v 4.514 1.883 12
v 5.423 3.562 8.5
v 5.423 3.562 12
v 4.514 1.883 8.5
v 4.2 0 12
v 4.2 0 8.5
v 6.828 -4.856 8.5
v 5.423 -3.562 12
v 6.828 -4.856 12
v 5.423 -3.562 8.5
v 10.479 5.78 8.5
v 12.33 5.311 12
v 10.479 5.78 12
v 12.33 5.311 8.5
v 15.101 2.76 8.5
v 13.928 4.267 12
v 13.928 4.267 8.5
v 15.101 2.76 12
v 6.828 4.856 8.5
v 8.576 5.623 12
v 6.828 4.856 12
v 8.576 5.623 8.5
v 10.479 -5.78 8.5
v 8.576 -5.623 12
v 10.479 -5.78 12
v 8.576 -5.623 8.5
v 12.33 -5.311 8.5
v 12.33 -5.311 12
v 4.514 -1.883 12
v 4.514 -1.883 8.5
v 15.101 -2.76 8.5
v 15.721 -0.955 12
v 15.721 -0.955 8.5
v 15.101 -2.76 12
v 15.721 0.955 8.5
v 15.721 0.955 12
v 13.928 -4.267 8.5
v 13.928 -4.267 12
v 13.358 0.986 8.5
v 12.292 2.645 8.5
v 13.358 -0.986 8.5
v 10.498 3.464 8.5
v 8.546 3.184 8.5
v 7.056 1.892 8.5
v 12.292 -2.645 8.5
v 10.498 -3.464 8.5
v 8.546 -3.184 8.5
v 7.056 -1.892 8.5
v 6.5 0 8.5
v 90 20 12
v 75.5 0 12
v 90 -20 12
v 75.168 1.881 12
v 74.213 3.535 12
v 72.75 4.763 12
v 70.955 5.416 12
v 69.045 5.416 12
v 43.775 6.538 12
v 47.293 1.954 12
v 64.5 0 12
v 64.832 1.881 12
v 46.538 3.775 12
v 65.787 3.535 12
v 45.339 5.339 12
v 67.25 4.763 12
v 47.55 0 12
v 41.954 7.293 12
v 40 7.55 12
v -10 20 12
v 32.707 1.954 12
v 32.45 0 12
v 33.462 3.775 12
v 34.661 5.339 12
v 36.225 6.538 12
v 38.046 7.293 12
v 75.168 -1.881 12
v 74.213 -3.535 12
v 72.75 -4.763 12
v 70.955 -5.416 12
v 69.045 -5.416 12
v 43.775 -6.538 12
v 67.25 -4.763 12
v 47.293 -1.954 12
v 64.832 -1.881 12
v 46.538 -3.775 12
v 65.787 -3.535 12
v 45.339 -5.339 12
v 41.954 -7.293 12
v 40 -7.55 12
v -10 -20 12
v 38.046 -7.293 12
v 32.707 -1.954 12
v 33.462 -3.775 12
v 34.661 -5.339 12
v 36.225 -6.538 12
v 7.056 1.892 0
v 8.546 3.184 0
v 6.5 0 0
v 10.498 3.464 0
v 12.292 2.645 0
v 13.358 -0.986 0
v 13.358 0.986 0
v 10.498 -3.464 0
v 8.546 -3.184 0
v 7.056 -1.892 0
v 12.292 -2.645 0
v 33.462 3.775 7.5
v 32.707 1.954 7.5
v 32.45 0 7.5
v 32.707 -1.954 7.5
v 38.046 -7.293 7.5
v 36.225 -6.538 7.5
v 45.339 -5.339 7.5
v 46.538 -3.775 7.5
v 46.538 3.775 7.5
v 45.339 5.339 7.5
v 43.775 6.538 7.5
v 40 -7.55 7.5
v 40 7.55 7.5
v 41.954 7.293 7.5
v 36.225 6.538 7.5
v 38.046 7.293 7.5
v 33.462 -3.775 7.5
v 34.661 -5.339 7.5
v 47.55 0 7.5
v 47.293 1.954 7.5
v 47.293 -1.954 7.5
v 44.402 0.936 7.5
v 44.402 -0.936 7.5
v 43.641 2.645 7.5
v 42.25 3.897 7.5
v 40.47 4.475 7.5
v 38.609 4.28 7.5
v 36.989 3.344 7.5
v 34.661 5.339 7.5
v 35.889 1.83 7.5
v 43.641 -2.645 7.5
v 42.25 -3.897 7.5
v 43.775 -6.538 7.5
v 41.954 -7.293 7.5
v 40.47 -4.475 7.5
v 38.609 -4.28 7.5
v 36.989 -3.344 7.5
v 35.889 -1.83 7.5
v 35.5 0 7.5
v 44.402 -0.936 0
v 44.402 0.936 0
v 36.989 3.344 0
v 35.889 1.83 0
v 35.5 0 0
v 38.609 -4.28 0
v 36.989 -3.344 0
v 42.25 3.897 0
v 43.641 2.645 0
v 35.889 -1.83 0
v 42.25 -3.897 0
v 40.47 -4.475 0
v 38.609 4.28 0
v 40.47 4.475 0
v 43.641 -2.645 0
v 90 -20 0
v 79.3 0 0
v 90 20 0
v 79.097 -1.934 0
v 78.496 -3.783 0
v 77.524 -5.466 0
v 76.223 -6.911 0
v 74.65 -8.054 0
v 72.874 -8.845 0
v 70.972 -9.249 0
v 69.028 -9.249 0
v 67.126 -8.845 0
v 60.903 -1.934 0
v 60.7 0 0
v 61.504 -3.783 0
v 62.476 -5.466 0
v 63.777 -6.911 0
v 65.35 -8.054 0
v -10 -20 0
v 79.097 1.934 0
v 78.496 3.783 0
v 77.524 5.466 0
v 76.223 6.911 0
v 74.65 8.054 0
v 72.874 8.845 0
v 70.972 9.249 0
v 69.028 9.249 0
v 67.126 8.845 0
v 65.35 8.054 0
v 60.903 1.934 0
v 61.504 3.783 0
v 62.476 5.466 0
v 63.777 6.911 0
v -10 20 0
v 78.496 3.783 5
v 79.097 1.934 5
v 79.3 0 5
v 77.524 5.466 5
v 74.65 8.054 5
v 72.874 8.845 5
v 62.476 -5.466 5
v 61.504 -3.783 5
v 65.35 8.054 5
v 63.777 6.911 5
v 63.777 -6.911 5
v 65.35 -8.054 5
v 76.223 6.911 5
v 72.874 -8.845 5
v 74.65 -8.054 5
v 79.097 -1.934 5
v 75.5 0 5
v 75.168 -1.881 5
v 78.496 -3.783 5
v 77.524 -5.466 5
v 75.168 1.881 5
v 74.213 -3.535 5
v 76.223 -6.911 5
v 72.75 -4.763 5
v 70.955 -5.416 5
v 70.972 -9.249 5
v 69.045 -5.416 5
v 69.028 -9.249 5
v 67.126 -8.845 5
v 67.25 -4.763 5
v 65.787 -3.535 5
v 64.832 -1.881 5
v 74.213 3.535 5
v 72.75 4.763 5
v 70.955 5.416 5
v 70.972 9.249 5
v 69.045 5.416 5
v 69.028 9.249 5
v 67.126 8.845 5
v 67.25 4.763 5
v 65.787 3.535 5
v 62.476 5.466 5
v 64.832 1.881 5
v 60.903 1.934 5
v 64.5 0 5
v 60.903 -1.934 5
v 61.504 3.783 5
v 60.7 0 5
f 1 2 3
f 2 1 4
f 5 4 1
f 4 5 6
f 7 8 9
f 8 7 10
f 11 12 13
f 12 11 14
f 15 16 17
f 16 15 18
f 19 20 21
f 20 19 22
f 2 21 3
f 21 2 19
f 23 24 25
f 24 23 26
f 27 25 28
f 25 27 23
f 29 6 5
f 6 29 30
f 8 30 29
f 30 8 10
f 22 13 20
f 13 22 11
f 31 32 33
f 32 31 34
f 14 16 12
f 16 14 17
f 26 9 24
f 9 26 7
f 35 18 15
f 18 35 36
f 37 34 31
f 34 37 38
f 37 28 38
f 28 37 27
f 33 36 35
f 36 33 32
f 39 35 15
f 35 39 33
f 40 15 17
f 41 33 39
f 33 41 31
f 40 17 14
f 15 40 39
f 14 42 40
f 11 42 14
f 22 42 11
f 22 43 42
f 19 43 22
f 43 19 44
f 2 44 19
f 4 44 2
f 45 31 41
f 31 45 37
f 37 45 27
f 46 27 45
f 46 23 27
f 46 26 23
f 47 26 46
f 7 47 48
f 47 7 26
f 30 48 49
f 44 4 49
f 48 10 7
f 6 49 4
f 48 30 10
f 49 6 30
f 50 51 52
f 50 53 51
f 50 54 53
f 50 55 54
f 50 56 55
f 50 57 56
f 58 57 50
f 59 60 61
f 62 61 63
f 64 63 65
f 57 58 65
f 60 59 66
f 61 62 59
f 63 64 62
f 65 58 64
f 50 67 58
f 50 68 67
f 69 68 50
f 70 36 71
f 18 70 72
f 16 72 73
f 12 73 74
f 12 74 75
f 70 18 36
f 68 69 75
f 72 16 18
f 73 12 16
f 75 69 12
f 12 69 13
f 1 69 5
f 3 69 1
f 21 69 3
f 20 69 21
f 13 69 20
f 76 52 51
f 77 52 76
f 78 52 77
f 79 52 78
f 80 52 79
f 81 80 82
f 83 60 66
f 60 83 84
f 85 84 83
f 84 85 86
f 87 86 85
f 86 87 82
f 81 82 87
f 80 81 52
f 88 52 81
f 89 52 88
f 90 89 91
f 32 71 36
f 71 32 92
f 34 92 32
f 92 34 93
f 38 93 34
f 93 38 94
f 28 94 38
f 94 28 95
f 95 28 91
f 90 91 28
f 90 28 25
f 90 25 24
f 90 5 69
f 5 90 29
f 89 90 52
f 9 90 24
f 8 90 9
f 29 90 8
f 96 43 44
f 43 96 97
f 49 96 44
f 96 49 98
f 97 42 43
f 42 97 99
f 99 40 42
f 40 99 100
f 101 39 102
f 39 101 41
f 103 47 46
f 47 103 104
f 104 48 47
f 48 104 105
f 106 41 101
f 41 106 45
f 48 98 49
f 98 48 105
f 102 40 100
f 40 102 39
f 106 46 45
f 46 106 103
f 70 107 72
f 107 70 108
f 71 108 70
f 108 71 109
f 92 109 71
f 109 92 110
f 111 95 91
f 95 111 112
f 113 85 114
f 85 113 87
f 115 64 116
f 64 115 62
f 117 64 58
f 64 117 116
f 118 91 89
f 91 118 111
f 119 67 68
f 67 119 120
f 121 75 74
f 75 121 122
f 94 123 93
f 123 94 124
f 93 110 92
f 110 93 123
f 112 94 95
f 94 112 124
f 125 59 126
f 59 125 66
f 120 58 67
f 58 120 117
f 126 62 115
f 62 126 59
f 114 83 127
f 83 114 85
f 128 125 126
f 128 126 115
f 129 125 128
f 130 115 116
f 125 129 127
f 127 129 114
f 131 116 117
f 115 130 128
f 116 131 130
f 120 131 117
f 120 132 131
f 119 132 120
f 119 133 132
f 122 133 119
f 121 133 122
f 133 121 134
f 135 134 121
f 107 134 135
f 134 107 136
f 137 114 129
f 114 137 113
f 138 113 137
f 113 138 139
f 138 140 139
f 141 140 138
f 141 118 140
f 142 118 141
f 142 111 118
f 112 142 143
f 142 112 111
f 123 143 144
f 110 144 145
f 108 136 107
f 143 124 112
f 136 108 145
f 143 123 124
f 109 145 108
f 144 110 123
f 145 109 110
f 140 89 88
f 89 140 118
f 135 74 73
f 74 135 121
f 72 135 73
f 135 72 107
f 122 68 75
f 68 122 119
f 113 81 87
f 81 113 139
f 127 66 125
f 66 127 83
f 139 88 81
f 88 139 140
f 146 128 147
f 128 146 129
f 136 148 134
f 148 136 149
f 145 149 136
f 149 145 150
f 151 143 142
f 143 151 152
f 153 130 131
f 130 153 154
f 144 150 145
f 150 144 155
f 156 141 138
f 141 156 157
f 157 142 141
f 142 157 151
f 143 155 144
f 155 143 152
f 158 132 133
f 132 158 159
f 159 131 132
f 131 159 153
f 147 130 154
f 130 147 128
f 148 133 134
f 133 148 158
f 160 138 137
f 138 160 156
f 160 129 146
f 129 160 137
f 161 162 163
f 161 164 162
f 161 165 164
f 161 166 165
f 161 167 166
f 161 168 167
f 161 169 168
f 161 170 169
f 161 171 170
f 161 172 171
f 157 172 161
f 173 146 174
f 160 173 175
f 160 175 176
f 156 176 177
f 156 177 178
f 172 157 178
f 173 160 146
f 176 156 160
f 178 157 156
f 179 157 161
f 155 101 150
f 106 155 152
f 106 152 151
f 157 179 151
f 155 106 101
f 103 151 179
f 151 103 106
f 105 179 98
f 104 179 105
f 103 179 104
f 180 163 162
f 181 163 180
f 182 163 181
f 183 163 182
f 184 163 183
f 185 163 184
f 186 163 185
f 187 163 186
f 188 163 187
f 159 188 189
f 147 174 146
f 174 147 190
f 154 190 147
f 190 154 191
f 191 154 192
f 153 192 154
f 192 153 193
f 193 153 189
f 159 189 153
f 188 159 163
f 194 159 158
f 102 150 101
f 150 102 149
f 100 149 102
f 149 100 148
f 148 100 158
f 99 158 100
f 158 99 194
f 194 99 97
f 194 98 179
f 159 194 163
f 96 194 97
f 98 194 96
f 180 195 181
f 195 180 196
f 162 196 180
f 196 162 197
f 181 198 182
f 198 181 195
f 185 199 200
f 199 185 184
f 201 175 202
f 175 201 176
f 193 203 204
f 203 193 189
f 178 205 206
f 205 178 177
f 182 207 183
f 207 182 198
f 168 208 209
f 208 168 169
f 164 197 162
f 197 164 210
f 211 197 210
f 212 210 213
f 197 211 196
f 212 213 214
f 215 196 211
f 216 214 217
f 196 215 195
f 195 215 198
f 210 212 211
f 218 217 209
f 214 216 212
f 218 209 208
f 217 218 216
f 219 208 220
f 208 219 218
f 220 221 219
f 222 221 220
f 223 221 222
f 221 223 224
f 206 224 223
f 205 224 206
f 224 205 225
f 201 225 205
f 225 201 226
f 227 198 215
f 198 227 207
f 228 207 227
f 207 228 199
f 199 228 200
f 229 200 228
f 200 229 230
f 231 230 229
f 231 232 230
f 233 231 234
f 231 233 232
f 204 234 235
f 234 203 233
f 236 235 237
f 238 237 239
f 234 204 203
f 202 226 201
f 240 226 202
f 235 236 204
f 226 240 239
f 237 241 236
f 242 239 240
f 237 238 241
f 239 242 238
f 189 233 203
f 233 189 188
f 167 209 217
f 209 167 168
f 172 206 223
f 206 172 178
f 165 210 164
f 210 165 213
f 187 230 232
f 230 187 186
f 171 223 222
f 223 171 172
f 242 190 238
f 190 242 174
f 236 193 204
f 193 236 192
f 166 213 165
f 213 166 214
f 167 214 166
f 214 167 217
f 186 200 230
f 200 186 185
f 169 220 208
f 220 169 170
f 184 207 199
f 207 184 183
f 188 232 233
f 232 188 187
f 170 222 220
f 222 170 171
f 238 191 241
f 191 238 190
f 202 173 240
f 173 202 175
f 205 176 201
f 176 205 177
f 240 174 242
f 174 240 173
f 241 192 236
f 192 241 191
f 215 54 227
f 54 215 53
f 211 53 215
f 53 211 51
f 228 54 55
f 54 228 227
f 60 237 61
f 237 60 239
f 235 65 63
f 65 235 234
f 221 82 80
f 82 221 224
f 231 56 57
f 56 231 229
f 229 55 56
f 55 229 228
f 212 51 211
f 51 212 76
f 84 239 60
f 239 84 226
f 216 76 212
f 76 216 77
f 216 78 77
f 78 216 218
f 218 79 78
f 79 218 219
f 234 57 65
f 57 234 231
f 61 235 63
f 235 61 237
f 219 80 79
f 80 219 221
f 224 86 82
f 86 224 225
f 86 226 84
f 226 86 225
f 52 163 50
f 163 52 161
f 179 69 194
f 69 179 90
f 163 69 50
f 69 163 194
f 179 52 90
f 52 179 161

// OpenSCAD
// =====================================================
// CALCULADORA DE AVELLANADO - TORNILLOS MÉTRICOS
// Para tornillos de madera - Versión cilindro recto
// DEMO 3D: placa real con los cortes aplicados
// =====================================================

// Función que calcula el diámetro de cabeza y altura
// según el diámetro de la rosca (D) en mm
function cabeza_tornillo(D) =
    D <= 3  ? [5.6,  1.65] :  // M3
    D <= 4  ? [7.5,  2.2]  :  // M4
    D <= 5  ? [9.2,  2.5]  :  // M5
    D <= 6  ? [11.0, 3.0]  :  // M6
    D <= 8  ? [14.5, 4.0]  :  // M8
    D <= 10 ? [18.0, 5.0]  :  // M10
    D <= 12 ? [22.0, 6.0]  :  // M12
    D <= 14 ? [26.0, 7.0]  :  // M14
    D <= 16 ? [30.0, 8.0]  :  // M16
    [D * 1.8, D * 0.5];       // fórmula general

// =====================================================
// MÓDULO SIMPLIFICADO - CILINDRO RECTO
// =====================================================
module avellanado_cilindrico(
    diametro_rosca,
    profundidad_avellano,
    holgura = 0.3
) {
    datos = cabeza_tornillo(diametro_rosca);
    diametro_cabeza = datos[0];

    translate([0, 0, 0])
        cylinder(h = profundidad_avellano,
                 r = (diametro_cabeza/2) + holgura);
}

// =====================================================
// MÓDULO PARA AGUJERO PASANTE (solo diámetro)
// =====================================================
module agujero_pasante(
    diametro_rosca,
    profundidad,
    profundidad_avellano = 0,
    holgura = 0.5,
    profundidad_abs = true
) {
    if (profundidad_abs)
        translate([0, 0, profundidad_avellano])
            cylinder(h = profundidad - profundidad_avellano,
                     r = (diametro_rosca/2) + holgura);
    else
        translate([0, 0, profundidad_avellano])
            cylinder(h = profundidad,
                     r = (diametro_rosca/2) + holgura);
}

// =====================================================
// MÓDULO COMBINADO - AVELLANADO + AGUJERO PASANTE
// =====================================================
module agujero_con_avellanado(
    diametro_rosca,
    profundidad_avellano,
    profundidad_pieza,
    holgura_avellano = 0.3,
    holgura_pasante = 0.5,
    profundidad_abs = true
) {
    avellanado_cilindrico(
        diametro_rosca = diametro_rosca,
        profundidad_avellano = profundidad_avellano,
        holgura = holgura_avellano
    );

    agujero_pasante(
        diametro_rosca = diametro_rosca,
        profundidad = profundidad_pieza,
        profundidad_avellano = profundidad_avellano,
        holgura = holgura_pasante,
        profundidad_abs = profundidad_abs
    );
}

// Funciones de utilidad
function diametro_cabeza(D) = cabeza_tornillo(D)[0];
function altura_cabeza(D) = cabeza_tornillo(D)[1];

// =====================================================
// DEMO 3D: placa con 3 avellanados de distinto diámetro
// margen de corte para evitar z-fighting en el booleano
// =====================================================
margen_corte = 0.5;
espesor_placa = 12;       // mm - grosor de la placa demo
ancho_placa   = 100;
largo_placa   = 40;

module placa_demo_metrica() {
    difference() {
        // Placa base
        translate([-10, -largo_placa/2, 0])
            cube([ancho_placa, largo_placa, espesor_placa]);

        // Avellanado M6, entra por la cara superior (z = espesor_placa)
        translate([10, 0, espesor_placa])
            rotate([0, 180, 0])
                agujero_con_avellanado(
                    diametro_rosca = 6,
                    profundidad_avellano = 3.5,
                    profundidad_pieza = espesor_placa + margen_corte
                );

        // Avellanado M8, entra por la cara superior
        translate([40, 0, espesor_placa])
            rotate([0, 180, 0])
                agujero_con_avellanado(
                    diametro_rosca = 8,
                    profundidad_avellano = 4.5,
                    profundidad_pieza = espesor_placa + margen_corte
                );

        // Avellanado M10, entra por la cara inferior (profundidad_abs=false)
        // demuestra el otro modo de medir la profundidad
        translate([70, 0, 0])
            agujero_con_avellanado(
                diametro_rosca = 10,
                profundidad_avellano = 5.0,
                profundidad_pieza = espesor_placa + margen_corte,
                profundidad_abs = false
            );
    }
}

placa_demo_metrica();
